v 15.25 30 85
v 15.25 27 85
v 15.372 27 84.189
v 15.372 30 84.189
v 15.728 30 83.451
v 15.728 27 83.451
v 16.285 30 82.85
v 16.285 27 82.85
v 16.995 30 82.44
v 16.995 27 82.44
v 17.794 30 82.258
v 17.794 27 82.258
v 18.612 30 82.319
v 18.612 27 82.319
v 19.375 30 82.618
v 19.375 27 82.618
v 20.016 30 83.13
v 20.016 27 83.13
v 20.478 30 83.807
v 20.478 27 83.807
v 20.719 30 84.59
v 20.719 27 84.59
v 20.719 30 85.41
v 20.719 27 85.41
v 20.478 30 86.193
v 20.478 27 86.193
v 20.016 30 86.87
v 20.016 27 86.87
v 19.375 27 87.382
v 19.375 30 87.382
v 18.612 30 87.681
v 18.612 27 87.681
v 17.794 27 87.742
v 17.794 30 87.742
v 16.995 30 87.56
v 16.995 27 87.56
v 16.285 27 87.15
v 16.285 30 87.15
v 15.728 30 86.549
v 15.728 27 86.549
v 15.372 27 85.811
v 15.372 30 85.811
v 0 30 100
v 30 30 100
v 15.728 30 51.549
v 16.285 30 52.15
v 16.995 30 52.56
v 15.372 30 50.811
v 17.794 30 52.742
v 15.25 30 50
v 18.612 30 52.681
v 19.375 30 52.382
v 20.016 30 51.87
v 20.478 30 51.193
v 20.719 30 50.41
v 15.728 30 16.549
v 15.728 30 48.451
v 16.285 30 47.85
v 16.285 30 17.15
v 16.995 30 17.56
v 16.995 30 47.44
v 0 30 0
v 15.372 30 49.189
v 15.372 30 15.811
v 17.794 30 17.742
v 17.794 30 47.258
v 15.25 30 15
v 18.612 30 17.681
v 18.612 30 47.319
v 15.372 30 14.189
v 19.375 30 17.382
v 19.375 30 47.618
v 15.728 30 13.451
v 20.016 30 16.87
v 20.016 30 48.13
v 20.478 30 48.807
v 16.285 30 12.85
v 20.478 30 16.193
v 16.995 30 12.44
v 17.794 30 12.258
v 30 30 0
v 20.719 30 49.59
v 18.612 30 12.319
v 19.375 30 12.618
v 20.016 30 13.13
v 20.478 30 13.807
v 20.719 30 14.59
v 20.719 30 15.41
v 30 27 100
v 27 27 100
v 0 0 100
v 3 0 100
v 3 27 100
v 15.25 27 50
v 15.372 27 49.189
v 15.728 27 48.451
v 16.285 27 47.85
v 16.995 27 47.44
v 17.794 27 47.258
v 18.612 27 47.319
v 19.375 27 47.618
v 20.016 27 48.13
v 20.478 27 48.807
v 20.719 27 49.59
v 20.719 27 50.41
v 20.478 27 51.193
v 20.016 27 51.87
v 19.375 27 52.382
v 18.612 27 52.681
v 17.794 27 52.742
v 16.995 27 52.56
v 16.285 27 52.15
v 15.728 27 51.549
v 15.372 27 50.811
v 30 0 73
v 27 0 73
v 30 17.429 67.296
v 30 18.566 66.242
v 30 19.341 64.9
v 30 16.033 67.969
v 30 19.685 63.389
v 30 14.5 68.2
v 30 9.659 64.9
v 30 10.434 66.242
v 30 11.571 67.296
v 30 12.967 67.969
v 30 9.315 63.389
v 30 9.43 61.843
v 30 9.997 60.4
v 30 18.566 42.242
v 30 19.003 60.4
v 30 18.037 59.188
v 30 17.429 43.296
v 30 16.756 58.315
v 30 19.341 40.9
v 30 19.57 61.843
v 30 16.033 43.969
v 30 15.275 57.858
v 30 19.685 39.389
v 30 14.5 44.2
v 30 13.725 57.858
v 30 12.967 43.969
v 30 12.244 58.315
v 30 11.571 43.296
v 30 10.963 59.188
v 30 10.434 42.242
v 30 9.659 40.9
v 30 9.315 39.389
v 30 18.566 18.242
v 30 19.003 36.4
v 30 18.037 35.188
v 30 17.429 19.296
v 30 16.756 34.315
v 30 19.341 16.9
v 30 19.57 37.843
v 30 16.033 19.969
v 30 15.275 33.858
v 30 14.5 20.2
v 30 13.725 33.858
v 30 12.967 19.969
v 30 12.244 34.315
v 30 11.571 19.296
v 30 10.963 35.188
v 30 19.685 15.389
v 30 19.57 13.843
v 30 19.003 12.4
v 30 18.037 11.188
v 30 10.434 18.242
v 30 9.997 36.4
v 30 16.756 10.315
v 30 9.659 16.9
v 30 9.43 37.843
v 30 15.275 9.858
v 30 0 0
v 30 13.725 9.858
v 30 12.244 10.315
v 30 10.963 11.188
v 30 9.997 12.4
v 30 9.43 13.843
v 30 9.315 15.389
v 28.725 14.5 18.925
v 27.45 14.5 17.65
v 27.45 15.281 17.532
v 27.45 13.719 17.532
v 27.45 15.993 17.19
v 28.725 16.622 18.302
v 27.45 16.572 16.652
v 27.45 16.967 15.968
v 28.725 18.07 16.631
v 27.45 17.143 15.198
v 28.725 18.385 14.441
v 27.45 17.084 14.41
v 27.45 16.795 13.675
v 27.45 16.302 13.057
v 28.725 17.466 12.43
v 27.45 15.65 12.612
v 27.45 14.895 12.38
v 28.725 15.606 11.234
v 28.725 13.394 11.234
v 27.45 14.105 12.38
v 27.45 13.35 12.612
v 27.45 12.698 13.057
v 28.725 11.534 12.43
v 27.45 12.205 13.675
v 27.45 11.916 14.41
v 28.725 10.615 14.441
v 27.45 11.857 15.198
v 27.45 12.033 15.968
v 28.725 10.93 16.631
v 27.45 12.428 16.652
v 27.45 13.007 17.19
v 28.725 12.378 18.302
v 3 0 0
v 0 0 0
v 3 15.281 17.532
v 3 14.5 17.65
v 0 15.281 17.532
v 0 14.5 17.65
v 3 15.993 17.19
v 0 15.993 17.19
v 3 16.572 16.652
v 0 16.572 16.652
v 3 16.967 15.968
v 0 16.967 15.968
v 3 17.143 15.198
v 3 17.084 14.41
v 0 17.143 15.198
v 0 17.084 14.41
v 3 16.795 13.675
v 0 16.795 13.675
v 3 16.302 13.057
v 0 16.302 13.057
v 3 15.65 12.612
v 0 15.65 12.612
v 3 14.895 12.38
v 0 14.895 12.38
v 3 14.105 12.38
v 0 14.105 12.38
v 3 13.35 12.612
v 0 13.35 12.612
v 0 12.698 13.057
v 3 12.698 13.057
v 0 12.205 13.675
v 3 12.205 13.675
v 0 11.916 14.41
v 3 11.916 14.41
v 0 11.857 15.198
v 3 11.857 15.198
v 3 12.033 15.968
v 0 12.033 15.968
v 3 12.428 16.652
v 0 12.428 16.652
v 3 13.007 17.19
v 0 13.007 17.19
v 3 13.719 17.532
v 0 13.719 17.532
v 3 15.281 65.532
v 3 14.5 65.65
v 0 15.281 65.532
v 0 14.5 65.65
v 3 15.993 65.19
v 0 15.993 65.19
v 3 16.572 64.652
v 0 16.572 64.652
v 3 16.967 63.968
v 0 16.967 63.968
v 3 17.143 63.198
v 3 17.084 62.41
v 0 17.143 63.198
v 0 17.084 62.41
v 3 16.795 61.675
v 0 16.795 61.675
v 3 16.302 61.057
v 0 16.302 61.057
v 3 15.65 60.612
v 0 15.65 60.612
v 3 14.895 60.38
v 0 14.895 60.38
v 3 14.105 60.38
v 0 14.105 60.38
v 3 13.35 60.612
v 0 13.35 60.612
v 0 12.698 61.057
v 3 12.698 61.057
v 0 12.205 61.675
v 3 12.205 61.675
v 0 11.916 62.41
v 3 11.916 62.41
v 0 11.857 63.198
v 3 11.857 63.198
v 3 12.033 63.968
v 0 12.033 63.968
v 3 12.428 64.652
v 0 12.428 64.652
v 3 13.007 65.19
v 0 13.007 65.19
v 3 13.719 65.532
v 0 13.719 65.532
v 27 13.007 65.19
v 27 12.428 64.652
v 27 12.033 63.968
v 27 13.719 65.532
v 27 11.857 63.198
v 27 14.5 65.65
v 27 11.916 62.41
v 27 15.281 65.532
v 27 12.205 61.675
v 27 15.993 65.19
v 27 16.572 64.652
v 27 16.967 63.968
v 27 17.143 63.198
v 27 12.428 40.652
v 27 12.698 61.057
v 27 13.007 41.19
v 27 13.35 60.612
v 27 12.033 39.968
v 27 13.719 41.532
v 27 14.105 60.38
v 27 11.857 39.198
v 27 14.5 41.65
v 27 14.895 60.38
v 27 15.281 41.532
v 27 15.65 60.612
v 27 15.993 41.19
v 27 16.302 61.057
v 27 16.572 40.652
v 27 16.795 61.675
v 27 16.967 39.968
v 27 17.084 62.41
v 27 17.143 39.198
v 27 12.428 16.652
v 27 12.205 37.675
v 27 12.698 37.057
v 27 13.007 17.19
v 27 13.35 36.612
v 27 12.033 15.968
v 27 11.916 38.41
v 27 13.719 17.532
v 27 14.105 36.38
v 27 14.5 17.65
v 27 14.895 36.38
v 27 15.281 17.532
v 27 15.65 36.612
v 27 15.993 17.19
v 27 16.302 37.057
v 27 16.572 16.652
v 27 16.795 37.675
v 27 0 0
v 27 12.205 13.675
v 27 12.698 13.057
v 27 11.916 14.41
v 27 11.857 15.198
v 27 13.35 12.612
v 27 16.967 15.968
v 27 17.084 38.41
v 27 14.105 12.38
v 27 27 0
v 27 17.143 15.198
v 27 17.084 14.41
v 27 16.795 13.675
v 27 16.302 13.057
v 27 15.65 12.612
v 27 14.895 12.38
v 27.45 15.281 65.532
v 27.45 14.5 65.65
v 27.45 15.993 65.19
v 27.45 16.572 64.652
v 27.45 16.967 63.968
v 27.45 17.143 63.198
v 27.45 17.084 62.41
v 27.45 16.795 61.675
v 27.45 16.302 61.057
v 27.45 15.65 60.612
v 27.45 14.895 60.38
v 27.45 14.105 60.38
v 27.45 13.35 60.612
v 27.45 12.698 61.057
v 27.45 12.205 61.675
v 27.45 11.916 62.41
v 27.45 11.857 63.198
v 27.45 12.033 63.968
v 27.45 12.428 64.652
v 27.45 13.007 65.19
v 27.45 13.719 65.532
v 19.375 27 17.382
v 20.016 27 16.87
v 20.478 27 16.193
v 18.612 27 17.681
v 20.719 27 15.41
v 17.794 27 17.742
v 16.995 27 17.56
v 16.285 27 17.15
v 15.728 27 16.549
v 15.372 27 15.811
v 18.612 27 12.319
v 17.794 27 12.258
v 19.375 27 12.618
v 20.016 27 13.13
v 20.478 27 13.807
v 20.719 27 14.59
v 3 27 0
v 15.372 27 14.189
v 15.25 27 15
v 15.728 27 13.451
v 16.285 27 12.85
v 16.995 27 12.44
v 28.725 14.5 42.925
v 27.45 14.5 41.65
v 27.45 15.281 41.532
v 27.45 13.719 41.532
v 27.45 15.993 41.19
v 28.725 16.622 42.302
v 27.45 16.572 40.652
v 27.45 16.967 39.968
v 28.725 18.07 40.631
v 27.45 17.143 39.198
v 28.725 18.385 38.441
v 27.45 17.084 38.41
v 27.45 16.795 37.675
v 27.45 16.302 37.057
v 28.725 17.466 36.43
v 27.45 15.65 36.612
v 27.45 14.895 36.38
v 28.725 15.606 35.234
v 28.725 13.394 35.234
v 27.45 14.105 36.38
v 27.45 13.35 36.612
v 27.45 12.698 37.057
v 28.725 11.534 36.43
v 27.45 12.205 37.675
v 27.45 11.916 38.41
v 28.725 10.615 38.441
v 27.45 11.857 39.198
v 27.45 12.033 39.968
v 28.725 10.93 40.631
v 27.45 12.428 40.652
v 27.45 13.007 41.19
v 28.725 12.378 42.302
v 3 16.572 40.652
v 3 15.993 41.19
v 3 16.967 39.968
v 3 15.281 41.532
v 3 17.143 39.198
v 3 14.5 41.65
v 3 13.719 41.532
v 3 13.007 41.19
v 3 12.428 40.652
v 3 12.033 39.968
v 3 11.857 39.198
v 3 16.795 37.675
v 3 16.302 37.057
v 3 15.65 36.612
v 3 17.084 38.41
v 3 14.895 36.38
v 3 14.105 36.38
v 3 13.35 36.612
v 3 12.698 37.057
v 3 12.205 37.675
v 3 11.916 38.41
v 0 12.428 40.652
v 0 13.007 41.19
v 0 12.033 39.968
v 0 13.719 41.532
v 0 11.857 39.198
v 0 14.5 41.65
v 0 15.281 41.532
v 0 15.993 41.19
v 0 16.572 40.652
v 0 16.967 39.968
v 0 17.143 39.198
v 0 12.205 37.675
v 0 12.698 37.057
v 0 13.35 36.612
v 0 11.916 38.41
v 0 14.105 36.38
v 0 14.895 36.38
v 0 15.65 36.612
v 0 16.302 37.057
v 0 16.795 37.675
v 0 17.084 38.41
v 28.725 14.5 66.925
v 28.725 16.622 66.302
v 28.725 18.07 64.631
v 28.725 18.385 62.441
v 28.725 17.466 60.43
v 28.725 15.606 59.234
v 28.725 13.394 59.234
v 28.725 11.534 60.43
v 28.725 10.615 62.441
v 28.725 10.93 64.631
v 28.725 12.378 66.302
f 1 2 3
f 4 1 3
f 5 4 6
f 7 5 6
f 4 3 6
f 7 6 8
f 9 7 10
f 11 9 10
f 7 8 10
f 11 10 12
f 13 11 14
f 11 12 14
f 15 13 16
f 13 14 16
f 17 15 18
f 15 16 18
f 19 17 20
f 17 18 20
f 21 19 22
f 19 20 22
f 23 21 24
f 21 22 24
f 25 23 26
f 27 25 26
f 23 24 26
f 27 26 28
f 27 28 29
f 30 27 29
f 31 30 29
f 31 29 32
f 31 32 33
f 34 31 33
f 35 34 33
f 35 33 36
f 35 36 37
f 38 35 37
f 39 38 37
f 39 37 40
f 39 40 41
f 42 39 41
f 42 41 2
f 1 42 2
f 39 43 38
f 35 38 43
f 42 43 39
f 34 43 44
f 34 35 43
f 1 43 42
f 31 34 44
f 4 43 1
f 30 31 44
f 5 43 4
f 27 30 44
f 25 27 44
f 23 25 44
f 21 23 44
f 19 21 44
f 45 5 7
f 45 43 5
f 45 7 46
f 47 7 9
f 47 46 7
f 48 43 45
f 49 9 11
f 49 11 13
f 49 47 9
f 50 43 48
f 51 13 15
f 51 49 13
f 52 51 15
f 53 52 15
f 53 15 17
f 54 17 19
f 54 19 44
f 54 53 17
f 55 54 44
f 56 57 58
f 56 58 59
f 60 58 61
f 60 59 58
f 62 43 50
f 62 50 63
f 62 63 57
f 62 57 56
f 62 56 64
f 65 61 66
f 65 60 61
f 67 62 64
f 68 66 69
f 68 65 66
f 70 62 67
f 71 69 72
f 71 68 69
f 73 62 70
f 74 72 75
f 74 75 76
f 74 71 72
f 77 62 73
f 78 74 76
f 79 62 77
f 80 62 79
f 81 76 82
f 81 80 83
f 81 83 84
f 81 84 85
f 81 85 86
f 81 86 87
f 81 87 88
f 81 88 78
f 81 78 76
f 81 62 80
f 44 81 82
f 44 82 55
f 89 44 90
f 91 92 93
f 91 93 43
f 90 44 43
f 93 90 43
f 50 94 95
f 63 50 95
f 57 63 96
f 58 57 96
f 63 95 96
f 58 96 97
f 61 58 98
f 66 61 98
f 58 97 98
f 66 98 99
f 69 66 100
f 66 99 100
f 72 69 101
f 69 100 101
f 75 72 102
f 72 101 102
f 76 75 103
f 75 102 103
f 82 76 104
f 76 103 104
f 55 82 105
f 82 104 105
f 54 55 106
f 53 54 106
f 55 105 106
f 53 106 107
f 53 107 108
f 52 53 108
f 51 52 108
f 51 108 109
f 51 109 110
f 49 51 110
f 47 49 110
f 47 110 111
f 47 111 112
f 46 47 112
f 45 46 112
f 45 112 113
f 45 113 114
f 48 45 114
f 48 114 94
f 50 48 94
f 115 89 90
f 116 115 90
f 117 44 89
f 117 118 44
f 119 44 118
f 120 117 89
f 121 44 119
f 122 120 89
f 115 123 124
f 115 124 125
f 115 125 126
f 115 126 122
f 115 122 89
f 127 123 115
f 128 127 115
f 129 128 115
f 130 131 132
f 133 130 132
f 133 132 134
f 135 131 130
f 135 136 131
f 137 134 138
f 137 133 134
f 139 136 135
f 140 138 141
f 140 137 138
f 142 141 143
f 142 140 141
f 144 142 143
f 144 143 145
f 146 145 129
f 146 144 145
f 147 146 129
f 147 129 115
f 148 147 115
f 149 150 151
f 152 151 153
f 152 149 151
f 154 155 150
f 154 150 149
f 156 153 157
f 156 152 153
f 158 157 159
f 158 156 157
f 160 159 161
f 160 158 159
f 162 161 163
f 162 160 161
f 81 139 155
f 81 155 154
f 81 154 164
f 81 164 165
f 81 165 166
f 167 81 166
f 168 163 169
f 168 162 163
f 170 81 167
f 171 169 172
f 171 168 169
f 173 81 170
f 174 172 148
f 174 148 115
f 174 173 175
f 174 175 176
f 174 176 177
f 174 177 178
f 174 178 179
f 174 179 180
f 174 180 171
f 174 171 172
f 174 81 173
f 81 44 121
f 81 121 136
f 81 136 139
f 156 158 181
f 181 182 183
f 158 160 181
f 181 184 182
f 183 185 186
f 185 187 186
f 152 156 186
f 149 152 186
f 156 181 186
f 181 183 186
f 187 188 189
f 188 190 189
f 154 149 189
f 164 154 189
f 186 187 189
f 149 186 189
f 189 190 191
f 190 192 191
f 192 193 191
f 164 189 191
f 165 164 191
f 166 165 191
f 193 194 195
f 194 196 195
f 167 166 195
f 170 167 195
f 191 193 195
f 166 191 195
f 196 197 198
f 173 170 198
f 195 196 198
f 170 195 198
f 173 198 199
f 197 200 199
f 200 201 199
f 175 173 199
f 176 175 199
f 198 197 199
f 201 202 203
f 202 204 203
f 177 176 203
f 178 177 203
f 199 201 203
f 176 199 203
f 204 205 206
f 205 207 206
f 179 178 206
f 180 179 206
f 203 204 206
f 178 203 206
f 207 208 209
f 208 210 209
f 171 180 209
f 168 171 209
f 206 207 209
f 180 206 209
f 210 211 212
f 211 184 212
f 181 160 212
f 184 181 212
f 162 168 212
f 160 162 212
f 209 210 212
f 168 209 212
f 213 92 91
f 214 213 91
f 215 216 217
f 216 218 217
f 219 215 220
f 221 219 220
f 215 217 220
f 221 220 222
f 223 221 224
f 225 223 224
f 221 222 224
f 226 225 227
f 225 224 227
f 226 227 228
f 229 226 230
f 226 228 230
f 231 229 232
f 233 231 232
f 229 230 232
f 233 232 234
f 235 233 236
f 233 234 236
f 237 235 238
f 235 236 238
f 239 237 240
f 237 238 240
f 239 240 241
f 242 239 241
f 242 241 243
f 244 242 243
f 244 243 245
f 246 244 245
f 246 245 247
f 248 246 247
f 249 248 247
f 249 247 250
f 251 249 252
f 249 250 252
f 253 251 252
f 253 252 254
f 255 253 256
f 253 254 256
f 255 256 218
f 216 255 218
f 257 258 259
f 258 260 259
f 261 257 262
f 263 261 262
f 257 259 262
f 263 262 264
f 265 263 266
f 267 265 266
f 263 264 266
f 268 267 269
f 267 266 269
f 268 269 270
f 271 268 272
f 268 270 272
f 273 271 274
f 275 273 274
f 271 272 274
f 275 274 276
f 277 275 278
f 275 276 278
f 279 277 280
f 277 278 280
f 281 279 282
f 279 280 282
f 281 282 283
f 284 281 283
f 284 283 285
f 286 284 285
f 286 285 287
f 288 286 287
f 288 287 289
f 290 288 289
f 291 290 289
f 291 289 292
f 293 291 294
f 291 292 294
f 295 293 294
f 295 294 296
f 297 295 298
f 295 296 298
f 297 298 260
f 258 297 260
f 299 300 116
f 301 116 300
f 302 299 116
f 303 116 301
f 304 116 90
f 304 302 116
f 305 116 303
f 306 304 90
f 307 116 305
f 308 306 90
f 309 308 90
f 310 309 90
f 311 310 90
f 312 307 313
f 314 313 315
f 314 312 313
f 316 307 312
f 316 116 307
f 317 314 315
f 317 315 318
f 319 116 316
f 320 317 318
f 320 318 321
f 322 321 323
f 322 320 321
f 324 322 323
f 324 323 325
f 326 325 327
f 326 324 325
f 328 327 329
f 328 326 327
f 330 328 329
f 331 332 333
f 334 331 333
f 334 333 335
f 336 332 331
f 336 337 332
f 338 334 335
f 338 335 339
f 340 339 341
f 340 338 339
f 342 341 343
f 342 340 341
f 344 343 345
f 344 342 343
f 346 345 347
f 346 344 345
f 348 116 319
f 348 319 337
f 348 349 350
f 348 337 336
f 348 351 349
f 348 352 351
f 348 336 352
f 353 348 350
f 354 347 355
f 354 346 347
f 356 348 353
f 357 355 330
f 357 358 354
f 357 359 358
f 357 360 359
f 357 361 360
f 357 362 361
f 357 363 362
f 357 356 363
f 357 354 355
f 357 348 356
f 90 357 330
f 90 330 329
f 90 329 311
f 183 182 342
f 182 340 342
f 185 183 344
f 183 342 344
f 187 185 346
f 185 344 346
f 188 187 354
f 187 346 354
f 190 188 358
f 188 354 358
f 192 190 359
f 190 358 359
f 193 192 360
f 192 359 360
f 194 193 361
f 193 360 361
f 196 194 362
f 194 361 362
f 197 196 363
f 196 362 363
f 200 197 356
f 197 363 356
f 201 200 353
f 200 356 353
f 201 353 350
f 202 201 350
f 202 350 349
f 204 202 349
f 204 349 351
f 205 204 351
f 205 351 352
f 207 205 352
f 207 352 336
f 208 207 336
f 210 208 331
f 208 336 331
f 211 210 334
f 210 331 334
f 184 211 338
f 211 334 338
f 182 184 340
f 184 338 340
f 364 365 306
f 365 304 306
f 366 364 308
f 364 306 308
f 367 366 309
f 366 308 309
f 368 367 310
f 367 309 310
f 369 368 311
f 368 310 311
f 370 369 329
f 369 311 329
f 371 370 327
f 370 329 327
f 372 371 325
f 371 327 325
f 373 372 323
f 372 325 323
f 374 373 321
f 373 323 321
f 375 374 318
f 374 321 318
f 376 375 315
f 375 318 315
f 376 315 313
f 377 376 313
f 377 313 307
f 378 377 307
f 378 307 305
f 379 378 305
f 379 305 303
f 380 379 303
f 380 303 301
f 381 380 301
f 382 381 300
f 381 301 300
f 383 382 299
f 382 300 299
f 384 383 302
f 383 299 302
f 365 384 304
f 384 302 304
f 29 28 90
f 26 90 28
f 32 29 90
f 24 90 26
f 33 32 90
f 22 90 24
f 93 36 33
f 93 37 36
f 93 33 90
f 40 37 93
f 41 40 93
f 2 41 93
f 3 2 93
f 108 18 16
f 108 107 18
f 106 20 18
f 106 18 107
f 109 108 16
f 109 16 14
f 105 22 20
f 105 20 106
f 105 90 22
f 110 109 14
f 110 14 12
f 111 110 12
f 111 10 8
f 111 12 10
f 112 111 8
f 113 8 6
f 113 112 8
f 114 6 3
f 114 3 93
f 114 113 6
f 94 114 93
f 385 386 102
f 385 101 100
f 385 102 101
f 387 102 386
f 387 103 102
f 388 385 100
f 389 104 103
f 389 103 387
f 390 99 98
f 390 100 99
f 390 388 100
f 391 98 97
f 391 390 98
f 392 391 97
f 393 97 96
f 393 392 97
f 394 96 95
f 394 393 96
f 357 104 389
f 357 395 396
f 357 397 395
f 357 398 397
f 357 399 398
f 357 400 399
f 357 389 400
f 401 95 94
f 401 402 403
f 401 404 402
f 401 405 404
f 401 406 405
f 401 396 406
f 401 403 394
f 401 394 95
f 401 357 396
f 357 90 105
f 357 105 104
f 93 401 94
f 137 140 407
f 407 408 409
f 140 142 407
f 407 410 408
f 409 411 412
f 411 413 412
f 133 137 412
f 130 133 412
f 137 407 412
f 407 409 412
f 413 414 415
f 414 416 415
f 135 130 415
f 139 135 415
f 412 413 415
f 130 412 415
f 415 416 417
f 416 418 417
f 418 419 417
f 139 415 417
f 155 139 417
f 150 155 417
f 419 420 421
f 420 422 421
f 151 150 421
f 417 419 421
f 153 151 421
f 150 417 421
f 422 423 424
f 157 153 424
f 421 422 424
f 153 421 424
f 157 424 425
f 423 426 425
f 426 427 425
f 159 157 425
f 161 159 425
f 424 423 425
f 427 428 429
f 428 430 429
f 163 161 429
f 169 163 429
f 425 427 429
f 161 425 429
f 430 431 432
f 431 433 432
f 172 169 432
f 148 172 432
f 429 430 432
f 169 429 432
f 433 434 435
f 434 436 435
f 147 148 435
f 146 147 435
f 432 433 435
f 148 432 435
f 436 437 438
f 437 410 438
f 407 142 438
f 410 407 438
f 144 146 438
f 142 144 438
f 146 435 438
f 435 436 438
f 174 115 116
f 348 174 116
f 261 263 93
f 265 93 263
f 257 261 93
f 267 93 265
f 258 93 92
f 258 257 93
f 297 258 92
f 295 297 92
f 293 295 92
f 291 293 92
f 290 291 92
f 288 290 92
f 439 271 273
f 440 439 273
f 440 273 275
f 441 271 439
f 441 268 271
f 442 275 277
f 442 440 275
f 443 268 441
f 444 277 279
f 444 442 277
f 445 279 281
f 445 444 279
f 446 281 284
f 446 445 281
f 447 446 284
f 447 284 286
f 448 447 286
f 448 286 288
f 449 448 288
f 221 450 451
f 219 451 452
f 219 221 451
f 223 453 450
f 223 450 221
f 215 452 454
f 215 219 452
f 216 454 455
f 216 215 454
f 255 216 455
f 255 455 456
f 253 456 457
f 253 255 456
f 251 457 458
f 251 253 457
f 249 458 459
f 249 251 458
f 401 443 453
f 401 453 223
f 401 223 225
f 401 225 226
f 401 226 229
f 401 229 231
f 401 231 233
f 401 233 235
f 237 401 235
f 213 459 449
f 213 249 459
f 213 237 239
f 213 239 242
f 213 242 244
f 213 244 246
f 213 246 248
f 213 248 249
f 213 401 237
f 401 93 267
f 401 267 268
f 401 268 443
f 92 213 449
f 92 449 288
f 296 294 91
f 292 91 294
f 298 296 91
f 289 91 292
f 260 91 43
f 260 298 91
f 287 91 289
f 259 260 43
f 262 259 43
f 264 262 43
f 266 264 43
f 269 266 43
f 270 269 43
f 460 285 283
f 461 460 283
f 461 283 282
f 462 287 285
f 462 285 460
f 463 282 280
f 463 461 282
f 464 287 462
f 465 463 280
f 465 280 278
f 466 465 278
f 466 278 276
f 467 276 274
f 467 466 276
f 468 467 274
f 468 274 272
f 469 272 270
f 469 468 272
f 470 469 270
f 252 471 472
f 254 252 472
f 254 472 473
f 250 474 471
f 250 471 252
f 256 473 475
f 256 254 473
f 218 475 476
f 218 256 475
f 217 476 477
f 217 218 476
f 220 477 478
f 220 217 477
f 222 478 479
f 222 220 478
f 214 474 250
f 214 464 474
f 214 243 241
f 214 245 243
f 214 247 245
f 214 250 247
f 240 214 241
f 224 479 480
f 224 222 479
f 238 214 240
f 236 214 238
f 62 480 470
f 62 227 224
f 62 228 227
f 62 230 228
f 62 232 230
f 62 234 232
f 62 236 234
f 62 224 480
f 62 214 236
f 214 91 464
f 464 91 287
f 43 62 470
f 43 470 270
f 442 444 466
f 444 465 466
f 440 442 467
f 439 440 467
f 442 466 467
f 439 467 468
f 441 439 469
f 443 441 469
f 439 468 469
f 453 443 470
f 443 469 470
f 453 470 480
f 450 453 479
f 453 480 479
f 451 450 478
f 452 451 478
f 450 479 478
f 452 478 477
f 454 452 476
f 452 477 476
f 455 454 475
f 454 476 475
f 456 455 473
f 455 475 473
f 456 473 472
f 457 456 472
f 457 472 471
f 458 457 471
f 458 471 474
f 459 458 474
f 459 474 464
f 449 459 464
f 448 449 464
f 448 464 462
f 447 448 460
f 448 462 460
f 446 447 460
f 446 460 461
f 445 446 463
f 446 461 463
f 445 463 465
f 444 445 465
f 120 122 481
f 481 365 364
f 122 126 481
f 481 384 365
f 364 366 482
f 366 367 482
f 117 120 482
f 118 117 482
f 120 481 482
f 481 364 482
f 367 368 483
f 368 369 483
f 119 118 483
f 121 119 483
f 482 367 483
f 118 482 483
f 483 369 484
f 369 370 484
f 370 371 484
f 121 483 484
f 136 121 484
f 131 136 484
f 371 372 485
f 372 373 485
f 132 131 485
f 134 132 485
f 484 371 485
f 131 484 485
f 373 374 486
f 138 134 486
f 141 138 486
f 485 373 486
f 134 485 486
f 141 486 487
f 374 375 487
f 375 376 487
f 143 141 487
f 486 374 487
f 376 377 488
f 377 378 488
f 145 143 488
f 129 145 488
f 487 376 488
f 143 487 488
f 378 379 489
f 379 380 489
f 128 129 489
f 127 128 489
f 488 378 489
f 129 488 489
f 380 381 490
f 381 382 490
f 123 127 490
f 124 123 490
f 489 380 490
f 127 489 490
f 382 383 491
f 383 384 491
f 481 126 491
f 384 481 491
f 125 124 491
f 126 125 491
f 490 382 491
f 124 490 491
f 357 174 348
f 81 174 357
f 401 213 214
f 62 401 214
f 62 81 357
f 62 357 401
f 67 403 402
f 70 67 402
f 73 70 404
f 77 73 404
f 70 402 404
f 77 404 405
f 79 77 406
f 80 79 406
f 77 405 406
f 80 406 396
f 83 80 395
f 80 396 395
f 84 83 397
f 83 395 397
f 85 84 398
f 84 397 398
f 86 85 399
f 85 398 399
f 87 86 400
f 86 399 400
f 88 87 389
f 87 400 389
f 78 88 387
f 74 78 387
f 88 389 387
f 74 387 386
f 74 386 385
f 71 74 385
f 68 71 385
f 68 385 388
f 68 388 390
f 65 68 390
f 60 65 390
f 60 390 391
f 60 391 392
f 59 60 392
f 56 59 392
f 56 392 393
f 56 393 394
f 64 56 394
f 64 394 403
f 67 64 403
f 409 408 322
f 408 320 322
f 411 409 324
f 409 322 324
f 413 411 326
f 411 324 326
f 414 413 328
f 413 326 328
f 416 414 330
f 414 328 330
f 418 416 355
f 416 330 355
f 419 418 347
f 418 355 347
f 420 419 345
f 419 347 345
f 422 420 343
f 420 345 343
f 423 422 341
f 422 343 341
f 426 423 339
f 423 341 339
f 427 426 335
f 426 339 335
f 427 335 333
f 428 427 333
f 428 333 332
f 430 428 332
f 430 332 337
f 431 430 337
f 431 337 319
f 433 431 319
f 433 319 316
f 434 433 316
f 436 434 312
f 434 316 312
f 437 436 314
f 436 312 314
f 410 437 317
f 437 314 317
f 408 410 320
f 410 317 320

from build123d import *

# Parameters (mm, degrees)
DODANIE_WYCI_GNI_CIE1_DEPTH                         = 100
M5_CLEARANCE_HOLE1_D                                = 5.5
CSK_FOR_M5_COUNTERSUNK_FLAT_HEAD_SCREW1_D           = 5.3
CSK_FOR_M5_COUNTERSUNK_FLAT_HEAD_SCREW1_CSINK_D     = 10.4
CSK_FOR_M5_COUNTERSUNK_FLAT_HEAD_SCREW1_CSINK_ANGLE = 90
CHAMFER1_SIZE                                       = 27


with BuildPart() as part:
    # Szkic1 → Dodanie-wyciągnięcie1 (new body)
    with BuildSketch(Plane.XY):
        Polygon((0, 0), (0, 30), (30, 30), (30, 0), (27, 0), (27, 27), (3, 27), (3, 0), align=None)
    extrude(amount=DODANIE_WYCI_GNI_CIE1_DEPTH)

    # M5 Clearance Hole1 (through all)
    with Locations(Plane(origin=(0, 30, 0), x_dir=(1, 0, 0), z_dir=(0, 1, 0))):
        with Locations((18, -50), (18, -15), (18, -85)):
            Hole(M5_CLEARANCE_HOLE1_D / 2)

    # CSK for M5 Countersunk Flat Head Screw1 (through all)
    with Locations(Plane(origin=(30, 0, 0), x_dir=(0, 0, -1), z_dir=(1, 0, 0))):
        with Locations((-15, 14.5), (-63, 14.5), (-39, 14.5)):
            CounterSinkHole(CSK_FOR_M5_COUNTERSUNK_FLAT_HEAD_SCREW1_D / 2, CSK_FOR_M5_COUNTERSUNK_FLAT_HEAD_SCREW1_CSINK_D / 2, counter_sink_angle=CSK_FOR_M5_COUNTERSUNK_FLAT_HEAD_SCREW1_CSINK_ANGLE)

    # Chamfer1
    chamfer1_edges = [part.edges().sort_by_distance(p)[0] for p in [
        (28.5, 0, 100),
    ]]
    chamfer(chamfer1_edges, length=CHAMFER1_SIZE)


solid = part.part
